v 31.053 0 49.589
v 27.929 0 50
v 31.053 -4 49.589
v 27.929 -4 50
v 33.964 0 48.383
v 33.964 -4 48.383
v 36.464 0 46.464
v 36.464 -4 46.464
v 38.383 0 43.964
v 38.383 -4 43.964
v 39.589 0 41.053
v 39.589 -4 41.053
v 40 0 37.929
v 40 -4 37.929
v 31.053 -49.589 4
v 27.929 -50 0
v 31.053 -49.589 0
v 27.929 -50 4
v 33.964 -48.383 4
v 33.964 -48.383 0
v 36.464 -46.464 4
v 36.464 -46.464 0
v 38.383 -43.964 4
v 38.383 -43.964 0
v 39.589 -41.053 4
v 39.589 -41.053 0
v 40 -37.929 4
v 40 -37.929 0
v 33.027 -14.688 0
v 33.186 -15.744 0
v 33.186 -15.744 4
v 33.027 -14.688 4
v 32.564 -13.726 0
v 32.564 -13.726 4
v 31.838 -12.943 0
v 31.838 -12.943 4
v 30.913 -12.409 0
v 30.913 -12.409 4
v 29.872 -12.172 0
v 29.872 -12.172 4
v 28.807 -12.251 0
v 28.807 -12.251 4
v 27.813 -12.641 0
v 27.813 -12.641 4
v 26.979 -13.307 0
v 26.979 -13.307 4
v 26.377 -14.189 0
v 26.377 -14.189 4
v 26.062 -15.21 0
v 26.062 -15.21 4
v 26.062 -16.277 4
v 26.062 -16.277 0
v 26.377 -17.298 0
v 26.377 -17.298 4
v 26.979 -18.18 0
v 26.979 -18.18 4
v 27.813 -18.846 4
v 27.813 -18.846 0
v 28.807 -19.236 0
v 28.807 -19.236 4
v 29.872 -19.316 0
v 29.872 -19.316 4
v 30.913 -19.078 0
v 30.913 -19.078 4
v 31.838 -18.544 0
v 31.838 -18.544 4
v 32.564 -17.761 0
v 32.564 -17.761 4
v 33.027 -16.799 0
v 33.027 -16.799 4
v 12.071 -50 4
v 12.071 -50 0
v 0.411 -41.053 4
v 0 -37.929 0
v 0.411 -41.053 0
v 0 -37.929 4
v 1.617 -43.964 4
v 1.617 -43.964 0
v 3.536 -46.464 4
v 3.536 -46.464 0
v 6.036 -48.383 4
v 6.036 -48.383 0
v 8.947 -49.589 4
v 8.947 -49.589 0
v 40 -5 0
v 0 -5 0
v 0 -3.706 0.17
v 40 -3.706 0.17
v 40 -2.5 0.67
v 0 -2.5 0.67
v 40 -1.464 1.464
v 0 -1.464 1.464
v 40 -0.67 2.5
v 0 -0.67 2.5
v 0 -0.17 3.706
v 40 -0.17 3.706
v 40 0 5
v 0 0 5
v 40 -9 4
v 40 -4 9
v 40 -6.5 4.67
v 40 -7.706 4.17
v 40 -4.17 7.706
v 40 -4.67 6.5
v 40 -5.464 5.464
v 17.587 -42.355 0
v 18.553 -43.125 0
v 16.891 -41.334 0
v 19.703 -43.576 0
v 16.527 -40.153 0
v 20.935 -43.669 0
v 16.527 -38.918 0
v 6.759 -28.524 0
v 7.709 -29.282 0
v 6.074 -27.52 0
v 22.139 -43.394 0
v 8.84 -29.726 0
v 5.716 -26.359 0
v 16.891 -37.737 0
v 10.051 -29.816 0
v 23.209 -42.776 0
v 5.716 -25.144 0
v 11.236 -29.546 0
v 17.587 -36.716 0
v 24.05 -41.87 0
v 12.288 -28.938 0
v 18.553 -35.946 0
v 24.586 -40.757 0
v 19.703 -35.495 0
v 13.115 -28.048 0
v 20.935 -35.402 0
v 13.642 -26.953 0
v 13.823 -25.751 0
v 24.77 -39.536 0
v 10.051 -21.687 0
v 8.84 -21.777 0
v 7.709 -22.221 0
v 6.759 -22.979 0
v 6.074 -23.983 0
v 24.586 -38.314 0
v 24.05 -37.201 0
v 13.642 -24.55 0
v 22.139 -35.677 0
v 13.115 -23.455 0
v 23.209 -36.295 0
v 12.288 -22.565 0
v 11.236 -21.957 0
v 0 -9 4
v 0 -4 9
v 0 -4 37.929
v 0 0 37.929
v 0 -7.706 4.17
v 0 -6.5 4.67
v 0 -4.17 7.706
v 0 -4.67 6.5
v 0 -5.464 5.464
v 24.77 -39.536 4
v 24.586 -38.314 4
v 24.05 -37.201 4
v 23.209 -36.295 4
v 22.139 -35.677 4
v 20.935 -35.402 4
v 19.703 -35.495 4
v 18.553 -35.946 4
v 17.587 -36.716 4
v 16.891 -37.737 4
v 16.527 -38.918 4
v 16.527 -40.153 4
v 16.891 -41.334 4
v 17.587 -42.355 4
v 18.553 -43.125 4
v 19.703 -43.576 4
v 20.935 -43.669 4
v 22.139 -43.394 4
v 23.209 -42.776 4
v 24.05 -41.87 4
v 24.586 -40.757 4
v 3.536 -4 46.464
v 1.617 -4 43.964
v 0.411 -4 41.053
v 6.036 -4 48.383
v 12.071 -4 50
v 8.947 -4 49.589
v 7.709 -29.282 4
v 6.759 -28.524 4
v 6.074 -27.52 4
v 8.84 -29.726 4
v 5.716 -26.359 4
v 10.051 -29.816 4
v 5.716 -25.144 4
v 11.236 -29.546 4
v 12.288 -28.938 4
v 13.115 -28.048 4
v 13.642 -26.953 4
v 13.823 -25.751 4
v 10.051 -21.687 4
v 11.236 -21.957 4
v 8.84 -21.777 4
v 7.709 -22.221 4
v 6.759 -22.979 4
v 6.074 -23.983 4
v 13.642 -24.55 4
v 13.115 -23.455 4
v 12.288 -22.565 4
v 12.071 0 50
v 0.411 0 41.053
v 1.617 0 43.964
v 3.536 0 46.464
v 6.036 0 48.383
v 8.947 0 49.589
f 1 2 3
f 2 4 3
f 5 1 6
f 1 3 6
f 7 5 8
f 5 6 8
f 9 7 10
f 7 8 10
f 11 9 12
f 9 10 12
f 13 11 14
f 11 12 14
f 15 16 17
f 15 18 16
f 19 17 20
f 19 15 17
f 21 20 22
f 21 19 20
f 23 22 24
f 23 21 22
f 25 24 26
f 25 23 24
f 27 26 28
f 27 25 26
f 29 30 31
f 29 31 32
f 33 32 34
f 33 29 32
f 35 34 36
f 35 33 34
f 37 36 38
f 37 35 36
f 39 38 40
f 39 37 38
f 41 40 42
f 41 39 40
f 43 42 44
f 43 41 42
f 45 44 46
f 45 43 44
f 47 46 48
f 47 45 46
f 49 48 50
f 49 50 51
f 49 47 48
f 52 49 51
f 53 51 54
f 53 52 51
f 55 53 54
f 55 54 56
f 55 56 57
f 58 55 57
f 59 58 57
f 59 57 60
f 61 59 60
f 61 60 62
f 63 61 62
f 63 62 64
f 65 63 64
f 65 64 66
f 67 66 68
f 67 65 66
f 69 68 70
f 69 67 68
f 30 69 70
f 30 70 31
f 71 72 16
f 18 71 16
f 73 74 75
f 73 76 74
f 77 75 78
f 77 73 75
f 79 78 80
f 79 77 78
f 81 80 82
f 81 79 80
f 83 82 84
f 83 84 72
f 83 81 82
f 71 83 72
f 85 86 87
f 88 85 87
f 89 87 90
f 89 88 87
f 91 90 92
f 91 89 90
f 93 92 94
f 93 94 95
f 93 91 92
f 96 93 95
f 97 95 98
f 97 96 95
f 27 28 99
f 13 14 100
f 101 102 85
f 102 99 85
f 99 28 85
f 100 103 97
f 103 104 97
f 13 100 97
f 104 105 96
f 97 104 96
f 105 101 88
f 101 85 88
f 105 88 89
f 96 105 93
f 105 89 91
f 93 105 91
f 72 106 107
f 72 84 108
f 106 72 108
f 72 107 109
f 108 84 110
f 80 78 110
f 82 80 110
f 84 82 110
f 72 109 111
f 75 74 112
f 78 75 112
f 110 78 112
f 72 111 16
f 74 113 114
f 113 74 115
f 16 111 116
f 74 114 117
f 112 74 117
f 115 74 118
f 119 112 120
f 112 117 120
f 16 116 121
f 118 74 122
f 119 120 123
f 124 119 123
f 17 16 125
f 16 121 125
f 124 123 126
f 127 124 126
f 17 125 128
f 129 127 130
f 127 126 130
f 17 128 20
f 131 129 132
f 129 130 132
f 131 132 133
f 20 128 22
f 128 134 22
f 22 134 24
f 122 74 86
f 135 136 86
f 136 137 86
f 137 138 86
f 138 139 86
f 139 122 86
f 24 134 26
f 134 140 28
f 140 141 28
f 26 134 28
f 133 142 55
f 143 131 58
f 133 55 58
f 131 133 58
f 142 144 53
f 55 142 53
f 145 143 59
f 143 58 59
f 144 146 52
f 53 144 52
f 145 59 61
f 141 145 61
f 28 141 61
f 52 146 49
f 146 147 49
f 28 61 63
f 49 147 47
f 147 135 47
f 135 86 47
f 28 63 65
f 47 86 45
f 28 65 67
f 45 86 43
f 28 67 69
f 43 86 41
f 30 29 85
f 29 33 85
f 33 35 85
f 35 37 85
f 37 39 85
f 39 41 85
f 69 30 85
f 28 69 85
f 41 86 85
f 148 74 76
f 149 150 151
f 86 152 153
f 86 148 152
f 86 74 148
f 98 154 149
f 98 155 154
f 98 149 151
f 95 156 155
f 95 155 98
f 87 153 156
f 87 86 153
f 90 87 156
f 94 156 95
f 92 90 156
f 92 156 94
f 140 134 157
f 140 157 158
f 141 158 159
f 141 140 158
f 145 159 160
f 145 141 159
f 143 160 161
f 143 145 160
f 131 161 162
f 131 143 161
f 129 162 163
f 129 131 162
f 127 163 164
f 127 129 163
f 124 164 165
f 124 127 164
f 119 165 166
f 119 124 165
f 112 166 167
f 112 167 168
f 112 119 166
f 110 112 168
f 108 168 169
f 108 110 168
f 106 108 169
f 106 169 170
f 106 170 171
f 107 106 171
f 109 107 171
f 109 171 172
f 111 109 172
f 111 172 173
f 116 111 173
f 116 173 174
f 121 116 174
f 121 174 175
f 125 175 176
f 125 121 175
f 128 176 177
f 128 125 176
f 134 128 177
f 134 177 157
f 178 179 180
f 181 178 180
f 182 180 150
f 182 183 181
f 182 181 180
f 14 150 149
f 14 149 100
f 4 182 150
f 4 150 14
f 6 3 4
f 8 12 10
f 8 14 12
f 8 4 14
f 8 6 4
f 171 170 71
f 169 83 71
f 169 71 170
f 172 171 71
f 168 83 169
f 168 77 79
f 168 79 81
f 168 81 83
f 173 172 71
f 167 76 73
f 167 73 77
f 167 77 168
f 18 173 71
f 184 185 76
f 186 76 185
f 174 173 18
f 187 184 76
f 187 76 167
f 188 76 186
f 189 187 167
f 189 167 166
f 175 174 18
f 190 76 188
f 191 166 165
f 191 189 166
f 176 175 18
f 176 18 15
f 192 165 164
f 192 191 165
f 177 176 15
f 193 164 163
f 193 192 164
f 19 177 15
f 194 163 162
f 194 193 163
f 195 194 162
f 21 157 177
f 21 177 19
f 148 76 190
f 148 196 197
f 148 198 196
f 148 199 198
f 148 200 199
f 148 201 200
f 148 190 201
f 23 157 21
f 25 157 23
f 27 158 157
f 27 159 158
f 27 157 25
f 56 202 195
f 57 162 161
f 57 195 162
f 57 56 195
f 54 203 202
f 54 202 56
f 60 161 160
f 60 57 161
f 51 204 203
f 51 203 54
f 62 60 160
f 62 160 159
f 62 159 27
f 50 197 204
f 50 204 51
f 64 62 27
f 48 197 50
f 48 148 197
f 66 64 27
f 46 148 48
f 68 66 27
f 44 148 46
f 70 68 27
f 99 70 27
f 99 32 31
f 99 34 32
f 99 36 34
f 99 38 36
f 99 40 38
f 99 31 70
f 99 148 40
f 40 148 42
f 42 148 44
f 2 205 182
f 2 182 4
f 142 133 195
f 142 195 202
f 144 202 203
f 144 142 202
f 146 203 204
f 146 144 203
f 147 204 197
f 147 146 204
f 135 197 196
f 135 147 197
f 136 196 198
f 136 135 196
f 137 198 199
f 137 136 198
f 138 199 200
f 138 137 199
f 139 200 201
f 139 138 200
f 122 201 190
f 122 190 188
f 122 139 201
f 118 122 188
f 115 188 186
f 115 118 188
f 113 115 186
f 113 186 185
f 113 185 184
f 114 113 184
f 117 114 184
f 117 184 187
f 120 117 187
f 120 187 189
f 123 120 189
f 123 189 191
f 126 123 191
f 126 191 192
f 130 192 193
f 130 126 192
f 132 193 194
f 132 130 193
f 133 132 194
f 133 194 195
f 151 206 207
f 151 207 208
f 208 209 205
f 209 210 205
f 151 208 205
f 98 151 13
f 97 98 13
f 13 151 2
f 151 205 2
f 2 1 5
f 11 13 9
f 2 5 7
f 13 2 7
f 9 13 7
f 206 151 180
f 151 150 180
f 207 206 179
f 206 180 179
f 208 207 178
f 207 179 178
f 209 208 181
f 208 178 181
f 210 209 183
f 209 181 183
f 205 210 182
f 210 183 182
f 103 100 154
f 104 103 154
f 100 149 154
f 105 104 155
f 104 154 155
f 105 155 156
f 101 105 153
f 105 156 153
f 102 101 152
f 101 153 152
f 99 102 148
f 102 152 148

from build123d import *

# Parameters (mm, degrees)
F0_W     = 40
F0_H     = 50
F1_DEPTH = 4
F2_W     = 40
F2_H     = 50
F2_R     = 4.076244
F2_R_2   = 4.144667
F2_R_3   = 3.582064
F3_DEPTH = 4
F4_R     = 5
F5_R     = 5
F6_R     = 12.071068


with BuildPart() as f1:
    # F0 (on Front) → F1 (new body)
    with BuildSketch(Plane.XZ):
        with Locations((20, 25)):
            Rectangle(F0_W, F0_H)
    extrude(amount=F1_DEPTH)

    # F2 (on Top) → F3 (join)
    with BuildSketch(Plane.XY):
        with Locations((20, -25)):
            Rectangle(F2_W, F2_H)
        with Locations((9.746881, -25.751499)):
            Circle(F2_R, mode=Mode.SUBTRACT)
        with Locations((20.625249, -39.535552)):
            Circle(F2_R_2, mode=Mode.SUBTRACT)
        with Locations((29.604357, -15.743585)):
            Circle(F2_R_3, mode=Mode.SUBTRACT)
    extrude(amount=F3_DEPTH)

    # F4
    f4_edges = [f1.edges().sort_by_distance(p)[0] for p in [
        (20, -4, 4),
    ]]
    fillet(f4_edges, radius=F4_R)

    # F5
    f5_edges = [f1.edges().sort_by_distance(p)[0] for p in [
        (20, 0, 0),
    ]]
    fillet(f5_edges, radius=F5_R)

    # F6
    f6_edges = [f1.edges().sort_by_distance(p)[0] for p in [
        (0, -50, 2),
        (40, -50, 2),
        (40, -2, 50),
        (0, -2, 50),
    ]]
    fillet(f6_edges, radius=F6_R)


solid = f1.part
